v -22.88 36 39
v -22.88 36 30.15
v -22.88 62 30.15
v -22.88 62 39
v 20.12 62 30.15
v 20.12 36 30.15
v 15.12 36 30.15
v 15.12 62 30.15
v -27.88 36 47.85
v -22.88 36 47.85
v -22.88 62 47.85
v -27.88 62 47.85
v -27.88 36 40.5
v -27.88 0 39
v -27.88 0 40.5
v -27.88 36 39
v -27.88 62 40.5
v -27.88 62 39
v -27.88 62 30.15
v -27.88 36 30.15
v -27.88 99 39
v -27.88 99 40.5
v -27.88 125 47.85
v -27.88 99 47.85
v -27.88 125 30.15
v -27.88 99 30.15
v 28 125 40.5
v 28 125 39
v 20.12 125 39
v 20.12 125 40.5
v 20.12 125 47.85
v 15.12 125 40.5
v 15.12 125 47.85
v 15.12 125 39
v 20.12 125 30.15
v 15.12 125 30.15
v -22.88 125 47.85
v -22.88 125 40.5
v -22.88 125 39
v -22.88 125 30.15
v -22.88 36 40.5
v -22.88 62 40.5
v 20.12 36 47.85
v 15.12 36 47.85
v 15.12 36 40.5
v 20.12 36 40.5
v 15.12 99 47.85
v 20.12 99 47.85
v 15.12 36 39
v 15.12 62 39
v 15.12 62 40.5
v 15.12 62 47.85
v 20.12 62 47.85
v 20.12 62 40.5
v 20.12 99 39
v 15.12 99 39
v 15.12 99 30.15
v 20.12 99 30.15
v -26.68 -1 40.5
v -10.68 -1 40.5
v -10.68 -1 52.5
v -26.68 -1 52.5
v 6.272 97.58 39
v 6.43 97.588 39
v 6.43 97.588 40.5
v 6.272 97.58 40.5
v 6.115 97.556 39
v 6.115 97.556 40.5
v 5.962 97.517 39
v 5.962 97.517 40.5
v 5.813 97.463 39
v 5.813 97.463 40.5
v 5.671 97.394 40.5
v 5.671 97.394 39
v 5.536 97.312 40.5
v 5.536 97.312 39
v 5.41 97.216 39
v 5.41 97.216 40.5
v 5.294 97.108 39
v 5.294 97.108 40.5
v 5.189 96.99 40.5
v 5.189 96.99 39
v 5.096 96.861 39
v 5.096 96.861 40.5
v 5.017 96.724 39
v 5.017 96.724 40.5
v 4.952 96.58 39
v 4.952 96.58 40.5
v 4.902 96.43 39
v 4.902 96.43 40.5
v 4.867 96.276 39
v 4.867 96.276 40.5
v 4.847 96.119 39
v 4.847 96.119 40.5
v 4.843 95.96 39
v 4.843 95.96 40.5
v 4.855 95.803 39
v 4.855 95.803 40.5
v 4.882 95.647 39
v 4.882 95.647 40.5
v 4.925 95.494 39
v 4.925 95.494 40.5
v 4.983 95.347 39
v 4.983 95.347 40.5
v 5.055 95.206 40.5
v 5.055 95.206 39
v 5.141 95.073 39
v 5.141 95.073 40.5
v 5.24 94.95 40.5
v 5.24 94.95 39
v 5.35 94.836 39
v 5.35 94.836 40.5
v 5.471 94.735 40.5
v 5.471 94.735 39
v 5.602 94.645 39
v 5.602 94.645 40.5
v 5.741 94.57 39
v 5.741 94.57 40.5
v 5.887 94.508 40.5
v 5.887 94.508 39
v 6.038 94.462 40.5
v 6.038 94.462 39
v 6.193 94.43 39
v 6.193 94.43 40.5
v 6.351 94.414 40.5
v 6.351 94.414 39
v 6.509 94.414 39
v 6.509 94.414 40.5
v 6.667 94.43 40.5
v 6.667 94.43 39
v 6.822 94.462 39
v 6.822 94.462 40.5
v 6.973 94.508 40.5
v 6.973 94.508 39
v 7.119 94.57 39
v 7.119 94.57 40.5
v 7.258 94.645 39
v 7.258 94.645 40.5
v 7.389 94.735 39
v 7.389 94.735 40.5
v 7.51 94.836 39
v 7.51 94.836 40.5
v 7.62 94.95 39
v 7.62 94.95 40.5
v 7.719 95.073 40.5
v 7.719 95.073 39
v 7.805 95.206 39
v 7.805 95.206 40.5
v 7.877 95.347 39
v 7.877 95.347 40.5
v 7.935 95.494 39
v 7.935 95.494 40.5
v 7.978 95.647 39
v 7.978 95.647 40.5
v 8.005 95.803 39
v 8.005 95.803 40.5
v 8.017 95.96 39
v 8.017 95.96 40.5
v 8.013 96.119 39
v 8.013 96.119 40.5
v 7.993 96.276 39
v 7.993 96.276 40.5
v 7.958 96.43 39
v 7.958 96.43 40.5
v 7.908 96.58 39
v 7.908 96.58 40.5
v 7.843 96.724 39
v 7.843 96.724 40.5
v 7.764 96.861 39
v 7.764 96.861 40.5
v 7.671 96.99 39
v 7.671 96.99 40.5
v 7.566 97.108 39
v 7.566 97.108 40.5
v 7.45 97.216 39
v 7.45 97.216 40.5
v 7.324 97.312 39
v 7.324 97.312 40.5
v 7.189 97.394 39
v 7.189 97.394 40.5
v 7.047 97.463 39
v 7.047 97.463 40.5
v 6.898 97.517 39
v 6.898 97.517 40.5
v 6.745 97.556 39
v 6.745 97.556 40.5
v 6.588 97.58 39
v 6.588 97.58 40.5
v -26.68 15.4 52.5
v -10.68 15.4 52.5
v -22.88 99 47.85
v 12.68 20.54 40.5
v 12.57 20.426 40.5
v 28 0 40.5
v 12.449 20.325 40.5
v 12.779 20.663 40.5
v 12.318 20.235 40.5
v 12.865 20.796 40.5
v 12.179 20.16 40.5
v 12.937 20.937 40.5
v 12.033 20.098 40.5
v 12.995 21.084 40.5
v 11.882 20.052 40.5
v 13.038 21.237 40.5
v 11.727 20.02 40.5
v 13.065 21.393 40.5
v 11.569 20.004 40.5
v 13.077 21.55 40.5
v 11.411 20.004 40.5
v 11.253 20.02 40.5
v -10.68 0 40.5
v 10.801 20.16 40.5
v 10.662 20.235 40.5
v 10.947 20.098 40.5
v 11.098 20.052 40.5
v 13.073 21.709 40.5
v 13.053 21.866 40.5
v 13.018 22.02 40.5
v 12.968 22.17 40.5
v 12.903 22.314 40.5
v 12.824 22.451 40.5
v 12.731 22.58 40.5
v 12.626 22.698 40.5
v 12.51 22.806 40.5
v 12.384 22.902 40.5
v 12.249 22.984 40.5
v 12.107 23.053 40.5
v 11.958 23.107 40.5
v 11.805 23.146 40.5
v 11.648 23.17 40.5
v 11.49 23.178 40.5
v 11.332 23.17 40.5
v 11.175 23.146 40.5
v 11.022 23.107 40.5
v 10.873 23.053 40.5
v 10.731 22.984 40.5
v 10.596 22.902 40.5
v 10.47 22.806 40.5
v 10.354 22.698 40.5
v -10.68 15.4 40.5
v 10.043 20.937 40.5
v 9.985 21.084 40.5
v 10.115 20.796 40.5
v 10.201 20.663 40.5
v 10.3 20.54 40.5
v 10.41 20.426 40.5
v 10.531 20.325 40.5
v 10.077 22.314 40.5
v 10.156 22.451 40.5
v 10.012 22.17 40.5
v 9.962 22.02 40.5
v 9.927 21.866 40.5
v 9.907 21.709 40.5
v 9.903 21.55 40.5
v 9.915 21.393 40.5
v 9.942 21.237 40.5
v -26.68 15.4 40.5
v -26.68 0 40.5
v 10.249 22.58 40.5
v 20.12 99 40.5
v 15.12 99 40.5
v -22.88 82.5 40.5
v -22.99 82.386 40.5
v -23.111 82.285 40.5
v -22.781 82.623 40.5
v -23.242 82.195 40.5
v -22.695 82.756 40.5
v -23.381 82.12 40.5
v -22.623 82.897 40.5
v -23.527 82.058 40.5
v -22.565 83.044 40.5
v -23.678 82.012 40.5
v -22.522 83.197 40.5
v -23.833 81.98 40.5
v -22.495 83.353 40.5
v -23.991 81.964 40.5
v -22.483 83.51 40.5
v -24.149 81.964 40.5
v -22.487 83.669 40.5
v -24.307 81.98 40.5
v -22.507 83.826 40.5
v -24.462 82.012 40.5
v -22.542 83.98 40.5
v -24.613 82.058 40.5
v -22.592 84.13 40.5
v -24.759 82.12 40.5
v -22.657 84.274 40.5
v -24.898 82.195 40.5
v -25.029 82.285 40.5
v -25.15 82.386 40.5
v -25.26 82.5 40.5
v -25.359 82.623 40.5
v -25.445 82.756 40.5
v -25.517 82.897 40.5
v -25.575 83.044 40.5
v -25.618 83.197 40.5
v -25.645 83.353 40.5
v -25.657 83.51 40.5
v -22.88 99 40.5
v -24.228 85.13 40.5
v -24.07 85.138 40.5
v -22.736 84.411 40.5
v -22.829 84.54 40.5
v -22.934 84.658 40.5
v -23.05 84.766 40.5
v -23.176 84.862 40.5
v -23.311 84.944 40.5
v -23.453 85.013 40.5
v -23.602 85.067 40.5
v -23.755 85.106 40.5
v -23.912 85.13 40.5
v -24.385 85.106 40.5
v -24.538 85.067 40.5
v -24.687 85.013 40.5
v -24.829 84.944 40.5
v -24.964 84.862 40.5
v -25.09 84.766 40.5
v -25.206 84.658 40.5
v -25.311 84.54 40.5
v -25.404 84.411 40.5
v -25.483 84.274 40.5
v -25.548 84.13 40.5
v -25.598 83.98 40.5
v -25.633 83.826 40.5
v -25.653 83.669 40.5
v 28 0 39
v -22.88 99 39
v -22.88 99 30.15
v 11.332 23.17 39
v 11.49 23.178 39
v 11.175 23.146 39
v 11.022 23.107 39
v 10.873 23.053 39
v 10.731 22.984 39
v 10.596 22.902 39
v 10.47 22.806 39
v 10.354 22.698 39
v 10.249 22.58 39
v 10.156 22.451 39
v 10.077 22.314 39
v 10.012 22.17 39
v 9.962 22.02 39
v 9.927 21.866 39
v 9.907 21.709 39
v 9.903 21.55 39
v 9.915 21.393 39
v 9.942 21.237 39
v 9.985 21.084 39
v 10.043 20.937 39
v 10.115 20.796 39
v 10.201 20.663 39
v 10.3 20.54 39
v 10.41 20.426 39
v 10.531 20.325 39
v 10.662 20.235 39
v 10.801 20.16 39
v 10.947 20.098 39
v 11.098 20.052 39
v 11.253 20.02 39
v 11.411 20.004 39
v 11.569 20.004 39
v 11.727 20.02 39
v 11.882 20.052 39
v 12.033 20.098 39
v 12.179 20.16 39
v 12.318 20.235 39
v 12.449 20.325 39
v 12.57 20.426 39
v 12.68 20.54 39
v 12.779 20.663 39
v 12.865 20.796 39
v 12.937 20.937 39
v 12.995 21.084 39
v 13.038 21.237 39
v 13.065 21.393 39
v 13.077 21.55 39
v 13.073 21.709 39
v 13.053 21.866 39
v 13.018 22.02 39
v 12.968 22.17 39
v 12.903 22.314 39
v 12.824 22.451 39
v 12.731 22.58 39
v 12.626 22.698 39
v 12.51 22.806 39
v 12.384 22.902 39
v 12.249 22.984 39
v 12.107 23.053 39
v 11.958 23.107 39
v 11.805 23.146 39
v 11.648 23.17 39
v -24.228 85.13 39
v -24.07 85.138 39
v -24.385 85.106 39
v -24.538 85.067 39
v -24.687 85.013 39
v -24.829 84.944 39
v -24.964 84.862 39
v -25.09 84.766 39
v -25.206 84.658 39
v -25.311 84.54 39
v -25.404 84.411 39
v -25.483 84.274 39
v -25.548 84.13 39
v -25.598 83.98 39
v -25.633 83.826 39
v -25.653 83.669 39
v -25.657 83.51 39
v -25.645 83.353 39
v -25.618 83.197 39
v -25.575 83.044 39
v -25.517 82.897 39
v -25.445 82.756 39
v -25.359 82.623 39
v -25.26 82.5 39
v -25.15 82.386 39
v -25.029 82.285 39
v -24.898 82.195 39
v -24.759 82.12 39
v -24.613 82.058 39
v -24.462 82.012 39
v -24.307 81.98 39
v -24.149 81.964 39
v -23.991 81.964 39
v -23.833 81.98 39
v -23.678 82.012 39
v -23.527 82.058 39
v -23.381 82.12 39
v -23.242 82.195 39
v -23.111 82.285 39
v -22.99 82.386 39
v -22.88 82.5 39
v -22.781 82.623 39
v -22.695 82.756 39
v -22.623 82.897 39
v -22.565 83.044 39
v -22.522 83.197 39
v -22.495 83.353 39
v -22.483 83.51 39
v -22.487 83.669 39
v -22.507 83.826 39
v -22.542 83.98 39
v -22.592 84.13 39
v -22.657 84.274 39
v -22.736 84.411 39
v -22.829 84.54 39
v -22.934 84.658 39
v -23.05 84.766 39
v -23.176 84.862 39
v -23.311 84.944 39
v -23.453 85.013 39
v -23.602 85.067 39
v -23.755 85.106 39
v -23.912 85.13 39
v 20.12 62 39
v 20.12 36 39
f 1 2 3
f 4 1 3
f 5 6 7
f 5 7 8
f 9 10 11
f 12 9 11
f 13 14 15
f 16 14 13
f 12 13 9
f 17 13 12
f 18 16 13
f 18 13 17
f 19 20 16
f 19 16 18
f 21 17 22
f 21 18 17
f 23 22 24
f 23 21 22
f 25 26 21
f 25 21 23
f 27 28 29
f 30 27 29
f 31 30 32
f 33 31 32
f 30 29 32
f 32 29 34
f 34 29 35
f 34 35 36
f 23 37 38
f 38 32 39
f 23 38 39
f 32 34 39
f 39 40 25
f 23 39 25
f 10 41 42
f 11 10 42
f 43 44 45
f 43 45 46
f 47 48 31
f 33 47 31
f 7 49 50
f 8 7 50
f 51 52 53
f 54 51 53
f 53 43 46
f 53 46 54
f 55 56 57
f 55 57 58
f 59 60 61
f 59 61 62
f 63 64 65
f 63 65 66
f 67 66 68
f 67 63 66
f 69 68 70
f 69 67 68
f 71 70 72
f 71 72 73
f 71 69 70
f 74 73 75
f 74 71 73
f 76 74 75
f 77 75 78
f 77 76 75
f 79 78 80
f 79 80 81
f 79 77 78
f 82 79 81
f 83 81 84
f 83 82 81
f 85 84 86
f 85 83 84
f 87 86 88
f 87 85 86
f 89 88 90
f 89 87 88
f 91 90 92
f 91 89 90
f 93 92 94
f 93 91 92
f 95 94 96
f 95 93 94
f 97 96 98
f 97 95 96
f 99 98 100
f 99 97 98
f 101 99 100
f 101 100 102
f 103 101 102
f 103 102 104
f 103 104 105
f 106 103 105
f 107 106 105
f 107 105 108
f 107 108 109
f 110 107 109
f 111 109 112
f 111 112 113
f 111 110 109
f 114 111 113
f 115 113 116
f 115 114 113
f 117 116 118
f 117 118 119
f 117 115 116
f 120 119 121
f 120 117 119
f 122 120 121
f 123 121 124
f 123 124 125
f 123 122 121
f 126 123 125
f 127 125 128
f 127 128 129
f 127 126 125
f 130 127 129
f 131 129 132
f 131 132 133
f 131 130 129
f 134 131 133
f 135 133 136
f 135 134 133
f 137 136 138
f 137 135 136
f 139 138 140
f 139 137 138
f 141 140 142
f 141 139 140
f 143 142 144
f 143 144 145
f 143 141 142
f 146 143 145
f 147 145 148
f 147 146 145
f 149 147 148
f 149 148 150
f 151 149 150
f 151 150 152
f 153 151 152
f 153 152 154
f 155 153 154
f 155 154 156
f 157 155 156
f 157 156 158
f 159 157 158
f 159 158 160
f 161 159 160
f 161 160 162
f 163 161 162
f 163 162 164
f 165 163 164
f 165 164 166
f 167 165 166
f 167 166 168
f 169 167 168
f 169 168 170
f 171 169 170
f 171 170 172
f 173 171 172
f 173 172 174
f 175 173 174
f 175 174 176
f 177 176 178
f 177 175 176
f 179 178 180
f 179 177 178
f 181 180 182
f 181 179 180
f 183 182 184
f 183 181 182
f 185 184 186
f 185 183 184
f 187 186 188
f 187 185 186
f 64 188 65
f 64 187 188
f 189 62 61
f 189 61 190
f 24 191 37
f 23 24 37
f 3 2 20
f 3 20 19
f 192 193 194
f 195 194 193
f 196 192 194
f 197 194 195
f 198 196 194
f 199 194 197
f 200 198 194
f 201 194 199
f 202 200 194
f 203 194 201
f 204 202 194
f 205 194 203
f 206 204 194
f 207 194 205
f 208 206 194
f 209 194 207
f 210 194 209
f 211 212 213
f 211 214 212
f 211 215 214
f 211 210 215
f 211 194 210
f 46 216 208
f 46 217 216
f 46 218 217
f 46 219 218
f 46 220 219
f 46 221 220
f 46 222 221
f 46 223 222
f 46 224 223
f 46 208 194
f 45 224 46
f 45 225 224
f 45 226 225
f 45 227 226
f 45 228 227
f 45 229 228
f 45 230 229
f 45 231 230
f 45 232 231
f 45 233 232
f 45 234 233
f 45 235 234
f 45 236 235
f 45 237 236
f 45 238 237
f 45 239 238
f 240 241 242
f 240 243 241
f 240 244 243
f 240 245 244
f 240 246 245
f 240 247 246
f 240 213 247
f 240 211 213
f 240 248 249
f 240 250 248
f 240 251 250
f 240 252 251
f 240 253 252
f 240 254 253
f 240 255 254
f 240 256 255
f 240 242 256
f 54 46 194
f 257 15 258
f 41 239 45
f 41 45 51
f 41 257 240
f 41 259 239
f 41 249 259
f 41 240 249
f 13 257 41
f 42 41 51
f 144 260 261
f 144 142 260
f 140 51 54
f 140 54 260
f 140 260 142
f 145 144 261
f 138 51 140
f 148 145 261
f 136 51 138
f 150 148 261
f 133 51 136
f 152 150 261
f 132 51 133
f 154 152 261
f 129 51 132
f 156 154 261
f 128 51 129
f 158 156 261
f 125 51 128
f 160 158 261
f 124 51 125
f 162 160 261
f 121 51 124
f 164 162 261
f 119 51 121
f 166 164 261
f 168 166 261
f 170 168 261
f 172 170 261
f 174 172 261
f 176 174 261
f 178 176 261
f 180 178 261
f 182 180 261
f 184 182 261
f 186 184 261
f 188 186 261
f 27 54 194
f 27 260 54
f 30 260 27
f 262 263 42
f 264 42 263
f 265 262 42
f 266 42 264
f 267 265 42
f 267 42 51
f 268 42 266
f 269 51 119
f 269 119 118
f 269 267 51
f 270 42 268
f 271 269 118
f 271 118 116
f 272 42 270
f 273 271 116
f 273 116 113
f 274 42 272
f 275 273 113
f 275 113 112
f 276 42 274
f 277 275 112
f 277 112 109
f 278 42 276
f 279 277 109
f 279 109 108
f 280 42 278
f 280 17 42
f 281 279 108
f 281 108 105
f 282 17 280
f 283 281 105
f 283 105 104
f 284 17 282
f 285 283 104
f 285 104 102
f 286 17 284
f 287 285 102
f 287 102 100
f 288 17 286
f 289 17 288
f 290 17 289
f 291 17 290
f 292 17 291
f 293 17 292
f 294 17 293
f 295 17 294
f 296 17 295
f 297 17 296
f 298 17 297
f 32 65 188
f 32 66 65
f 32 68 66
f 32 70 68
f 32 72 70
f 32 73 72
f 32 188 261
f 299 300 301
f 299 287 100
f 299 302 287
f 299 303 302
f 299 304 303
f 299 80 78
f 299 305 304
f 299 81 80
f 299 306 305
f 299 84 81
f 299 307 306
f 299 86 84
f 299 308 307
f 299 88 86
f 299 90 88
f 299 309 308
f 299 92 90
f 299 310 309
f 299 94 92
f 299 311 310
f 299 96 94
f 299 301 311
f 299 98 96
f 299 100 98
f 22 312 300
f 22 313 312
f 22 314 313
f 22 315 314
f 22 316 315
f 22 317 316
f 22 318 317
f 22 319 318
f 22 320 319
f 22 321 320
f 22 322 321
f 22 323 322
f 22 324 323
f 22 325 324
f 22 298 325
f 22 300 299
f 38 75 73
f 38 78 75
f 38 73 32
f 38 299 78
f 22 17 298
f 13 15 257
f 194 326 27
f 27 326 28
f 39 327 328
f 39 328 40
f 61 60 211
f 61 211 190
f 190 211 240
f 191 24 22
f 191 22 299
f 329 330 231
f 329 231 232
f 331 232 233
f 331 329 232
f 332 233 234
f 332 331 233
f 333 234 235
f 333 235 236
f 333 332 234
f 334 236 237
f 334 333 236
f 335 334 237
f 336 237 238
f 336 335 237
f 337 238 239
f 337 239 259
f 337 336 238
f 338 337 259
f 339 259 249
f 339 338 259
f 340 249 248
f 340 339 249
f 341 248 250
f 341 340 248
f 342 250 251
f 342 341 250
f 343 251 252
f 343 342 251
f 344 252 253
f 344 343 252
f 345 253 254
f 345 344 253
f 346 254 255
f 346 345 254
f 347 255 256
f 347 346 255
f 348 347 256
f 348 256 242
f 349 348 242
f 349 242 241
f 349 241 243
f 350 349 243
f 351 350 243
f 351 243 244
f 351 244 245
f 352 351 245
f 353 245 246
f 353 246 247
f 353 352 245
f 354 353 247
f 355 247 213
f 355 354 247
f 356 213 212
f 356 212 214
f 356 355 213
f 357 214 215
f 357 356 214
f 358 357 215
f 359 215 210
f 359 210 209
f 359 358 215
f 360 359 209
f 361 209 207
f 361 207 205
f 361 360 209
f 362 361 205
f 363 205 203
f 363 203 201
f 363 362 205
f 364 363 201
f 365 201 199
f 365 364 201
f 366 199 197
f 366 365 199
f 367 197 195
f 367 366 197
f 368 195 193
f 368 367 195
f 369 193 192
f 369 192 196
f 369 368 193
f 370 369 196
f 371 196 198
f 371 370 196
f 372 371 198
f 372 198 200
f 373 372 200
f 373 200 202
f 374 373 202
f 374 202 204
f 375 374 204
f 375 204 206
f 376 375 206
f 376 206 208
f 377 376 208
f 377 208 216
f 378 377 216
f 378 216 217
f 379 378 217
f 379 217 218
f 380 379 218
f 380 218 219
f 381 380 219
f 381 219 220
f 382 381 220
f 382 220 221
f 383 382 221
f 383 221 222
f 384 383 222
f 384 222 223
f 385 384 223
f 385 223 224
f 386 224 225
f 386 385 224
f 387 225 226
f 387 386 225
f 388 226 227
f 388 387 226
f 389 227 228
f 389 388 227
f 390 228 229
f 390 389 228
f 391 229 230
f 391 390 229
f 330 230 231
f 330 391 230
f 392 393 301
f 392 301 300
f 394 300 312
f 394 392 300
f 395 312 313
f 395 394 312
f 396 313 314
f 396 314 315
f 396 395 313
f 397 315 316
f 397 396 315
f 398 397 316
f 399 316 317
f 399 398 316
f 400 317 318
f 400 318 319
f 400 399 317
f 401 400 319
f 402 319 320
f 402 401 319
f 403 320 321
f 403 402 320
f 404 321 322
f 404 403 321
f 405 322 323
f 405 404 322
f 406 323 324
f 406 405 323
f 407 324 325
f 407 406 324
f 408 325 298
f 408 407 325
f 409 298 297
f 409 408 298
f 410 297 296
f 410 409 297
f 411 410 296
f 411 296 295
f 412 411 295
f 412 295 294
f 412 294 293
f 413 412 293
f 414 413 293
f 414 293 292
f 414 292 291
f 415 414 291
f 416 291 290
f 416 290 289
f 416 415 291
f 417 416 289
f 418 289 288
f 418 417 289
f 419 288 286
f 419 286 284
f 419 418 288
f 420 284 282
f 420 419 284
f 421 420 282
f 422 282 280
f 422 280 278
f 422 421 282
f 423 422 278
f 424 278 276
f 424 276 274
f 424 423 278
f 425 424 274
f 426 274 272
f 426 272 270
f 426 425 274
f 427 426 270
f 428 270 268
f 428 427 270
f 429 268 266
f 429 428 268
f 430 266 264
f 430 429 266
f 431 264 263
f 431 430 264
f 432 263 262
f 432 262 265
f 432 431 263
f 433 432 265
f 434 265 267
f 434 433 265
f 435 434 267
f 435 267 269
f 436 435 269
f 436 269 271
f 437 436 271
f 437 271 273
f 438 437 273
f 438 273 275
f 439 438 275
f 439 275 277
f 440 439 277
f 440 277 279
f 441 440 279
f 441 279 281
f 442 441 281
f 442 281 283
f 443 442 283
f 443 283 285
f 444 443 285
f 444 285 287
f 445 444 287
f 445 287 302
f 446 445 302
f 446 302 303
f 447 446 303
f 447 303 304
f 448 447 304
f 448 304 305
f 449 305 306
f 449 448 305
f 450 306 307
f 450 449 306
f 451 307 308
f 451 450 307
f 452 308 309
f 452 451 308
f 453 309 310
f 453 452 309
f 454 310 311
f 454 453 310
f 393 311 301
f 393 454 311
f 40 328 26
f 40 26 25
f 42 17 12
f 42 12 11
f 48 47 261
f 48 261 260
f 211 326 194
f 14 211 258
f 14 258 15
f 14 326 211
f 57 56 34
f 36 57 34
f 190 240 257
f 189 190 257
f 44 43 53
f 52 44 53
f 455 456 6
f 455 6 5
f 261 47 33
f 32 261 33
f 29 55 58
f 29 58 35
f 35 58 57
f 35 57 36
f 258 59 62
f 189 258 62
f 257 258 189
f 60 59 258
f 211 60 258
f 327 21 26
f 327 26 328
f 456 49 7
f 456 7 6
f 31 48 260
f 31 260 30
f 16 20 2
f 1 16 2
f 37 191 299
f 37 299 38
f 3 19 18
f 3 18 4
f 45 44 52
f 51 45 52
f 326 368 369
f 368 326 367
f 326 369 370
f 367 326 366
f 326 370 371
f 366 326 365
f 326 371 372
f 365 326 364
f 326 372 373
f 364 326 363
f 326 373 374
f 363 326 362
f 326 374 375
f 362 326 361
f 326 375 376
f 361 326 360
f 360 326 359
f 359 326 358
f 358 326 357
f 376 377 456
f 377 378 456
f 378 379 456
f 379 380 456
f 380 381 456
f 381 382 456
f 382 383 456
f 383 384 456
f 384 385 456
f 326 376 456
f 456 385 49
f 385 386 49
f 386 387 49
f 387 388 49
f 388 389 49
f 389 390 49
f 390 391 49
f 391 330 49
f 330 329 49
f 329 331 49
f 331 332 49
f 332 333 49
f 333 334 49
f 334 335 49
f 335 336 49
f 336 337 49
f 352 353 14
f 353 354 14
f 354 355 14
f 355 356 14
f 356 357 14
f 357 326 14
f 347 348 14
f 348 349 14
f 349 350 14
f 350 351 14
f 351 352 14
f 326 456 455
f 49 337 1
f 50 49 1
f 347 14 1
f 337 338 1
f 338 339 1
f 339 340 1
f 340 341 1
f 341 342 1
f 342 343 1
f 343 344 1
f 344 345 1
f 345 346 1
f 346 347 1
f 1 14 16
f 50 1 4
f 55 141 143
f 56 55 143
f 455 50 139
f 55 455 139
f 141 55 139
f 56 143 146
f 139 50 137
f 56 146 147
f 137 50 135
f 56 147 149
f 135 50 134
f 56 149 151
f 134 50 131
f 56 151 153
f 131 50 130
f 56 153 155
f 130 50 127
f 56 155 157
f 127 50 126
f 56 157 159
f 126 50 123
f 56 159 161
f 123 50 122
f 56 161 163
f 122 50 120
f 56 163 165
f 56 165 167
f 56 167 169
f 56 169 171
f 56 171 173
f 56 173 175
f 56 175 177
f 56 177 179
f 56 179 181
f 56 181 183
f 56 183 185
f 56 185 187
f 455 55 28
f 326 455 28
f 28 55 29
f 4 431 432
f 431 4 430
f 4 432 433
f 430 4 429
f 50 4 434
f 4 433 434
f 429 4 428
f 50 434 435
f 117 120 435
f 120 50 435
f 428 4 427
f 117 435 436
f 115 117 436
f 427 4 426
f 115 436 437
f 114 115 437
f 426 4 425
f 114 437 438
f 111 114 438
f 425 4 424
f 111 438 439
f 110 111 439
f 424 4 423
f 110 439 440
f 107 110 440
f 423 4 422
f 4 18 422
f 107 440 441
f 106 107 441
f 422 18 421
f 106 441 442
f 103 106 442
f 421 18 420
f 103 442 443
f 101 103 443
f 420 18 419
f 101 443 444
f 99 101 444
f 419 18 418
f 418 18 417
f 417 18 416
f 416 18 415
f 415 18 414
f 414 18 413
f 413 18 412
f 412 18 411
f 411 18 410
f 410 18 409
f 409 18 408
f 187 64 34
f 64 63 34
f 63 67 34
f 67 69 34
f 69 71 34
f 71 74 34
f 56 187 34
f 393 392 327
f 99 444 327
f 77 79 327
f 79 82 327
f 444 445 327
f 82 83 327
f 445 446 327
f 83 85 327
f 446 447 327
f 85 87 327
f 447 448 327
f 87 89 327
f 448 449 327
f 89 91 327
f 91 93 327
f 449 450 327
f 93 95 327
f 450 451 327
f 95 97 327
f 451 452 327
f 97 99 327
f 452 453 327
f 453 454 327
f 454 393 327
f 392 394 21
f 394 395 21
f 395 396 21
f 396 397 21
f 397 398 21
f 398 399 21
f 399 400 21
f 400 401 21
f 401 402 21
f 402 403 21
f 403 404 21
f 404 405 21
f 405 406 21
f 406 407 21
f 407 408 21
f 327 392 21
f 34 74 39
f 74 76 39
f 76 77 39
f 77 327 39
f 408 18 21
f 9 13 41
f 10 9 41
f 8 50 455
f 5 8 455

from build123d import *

# Parameters (mm, degrees)
SKETCH018_W             = 125
SKETCH018_H             = 55.88
SKETCH018_R             = 1.5875
PAD007_DEPTH            = 1.5
SKETCH017_W             = 26
SKETCH017_H             = 5
PAD008_DEPTH            = 8.85
SKETCH019_W             = 16.4
SKETCH019_H             = 16
PAD009_DEPTH            = 12
BODY004_PLACEMENT_ANGLE = 90


with BuildPart() as part:
    # Sketch018 → Pad007 (new body)
    with BuildSketch(Plane.XY):
        with Locations((62.5, 27.94)):
            Rectangle(SKETCH018_W, SKETCH018_H)
        with Locations((21.59, 16.51)):
            Circle(SKETCH018_R, mode=Mode.SUBTRACT)
        with Locations((83.55, 52.07)):
            Circle(SKETCH018_R, mode=Mode.SUBTRACT)
        with Locations((96, 21.57)):
            Circle(SKETCH018_R, mode=Mode.SUBTRACT)
    extrude(amount=PAD007_DEPTH)

    # Sketch017 (on Face8 of Pad007) → Pad008 (join, symmetric)
    with BuildSketch(Plane(origin=(0, 0, 0), x_dir=(1, 0, 0), z_dir=(0, 0, -1))):
        with Locations((49, -10.38)):
            Rectangle(SKETCH017_W, SKETCH017_H)
        with Locations((112, -10.38)):
            Rectangle(SKETCH017_W, SKETCH017_H)
        with Locations((112, -53.38)):
            Rectangle(SKETCH017_W, SKETCH017_H)
        with Locations((49, -53.38)):
            Rectangle(SKETCH017_W, SKETCH017_H)
    extrude(amount=PAD008_DEPTH, both=True)

    # Sketch019 (on Face4 of Pad008) → Pad009 (join)
    with BuildSketch(Plane.XY.offset(1.5)):
        with Locations((7.2, 46.68)):
            Rectangle(SKETCH019_W, SKETCH019_H)
    extrude(amount=PAD009_DEPTH)


with BuildPart() as part_1:
    # Body004 placement: moved
    add(part.part.moved(Location((28, 0, 39))).rotate(Axis((28, 0, 39), (0, 0, 1)), BODY004_PLACEMENT_ANGLE))


solid = part_1.part
